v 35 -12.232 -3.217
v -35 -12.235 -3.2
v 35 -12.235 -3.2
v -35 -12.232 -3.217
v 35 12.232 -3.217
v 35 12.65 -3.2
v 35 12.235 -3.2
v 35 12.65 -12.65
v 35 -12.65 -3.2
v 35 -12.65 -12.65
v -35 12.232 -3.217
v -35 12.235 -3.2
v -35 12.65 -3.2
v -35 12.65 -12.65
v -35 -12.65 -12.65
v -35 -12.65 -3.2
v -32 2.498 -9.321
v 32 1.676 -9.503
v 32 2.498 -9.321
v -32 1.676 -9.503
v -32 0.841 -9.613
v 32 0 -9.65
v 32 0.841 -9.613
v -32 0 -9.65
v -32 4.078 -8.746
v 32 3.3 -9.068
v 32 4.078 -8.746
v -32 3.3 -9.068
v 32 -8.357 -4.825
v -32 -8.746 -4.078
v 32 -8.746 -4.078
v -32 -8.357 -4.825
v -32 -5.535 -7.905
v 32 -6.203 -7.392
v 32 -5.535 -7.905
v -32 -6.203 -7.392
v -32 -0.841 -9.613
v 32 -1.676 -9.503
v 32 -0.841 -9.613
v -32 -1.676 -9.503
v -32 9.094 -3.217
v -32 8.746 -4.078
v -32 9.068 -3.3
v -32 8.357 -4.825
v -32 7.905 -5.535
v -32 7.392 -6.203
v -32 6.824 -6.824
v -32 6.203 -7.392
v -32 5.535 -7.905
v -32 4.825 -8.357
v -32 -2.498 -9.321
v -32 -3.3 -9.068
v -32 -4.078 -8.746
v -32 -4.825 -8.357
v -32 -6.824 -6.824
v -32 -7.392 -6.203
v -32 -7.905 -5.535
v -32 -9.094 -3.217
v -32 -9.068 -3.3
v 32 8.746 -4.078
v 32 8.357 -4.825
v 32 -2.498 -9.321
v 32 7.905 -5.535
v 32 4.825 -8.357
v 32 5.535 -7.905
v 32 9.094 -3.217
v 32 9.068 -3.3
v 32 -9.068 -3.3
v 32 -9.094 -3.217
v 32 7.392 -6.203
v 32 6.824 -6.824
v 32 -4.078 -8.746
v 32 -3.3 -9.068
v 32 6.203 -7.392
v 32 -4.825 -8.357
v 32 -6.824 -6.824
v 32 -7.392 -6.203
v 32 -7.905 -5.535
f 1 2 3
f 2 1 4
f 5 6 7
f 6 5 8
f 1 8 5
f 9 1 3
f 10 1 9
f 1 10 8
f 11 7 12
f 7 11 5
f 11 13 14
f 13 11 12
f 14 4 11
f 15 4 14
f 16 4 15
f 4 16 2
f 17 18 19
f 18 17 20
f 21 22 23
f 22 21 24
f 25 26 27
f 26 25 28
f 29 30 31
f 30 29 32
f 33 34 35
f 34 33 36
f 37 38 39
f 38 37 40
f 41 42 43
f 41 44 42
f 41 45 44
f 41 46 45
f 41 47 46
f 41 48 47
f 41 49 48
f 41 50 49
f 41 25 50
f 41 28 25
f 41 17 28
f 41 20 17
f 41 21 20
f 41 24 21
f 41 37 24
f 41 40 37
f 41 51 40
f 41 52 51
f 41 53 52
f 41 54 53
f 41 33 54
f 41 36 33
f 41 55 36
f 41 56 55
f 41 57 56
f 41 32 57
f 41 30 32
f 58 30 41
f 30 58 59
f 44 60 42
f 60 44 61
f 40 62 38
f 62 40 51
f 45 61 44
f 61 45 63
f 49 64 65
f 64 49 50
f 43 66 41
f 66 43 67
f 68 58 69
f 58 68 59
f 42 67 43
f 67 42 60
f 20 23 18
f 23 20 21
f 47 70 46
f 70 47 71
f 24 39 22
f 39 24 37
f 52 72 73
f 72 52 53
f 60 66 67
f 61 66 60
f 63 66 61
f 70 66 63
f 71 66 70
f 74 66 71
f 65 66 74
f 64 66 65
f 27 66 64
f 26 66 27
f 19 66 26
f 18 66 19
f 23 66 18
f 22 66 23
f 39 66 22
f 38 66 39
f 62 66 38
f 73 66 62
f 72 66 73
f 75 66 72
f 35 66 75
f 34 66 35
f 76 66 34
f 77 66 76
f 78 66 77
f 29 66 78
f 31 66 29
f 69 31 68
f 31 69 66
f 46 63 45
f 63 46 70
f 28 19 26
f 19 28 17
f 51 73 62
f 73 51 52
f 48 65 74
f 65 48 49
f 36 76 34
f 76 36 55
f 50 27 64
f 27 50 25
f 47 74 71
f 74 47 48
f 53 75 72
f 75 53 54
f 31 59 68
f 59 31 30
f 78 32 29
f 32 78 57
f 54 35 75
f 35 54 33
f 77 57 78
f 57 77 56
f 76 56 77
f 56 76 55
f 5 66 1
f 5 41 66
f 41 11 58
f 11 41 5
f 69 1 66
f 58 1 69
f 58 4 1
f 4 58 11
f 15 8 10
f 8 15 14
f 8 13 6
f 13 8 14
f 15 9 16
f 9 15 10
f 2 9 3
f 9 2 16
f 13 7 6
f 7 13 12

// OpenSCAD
$fa = 5;
$fs = 0.4;

pennys_to_hold = 40;
holder_thickness = 3;
penny_diameter = 19.3;
penny_rad = penny_diameter/2;
penny_thickness = 1.6;
penny_shaft_height = penny_thickness*pennys_to_hold;
shell_radius = penny_diameter/2 + holder_thickness;

module penny_shaft(){
rotate([0,90,0])
cylinder(r=penny_rad,h=penny_shaft_height,center=true);
}

module holder_shaft(){
rotate([0,90,0])
cylinder(r=penny_rad+holder_thickness,h=penny_shaft_height+2*holder_thickness,center=true); 
}

union(){
difference(){
    holder_shaft();
    penny_shaft();
    translate([0,0,penny_rad/1.5])
    cube(size=[penny_shaft_height*2,penny_diameter*2,penny_diameter],center=true);
}

difference(){
    cube(size=[penny_shaft_height+2*holder_thickness,penny_diameter+2*holder_thickness,penny_diameter+2*holder_thickness],center=true);
    translate([5,0,0])
    holder_shaft();
    translate([-5,0,0])
    holder_shaft();
    translate([0,0,penny_rad-.2])
    cube(size=[penny_shaft_height+2*holder_thickness+1,penny_diameter+2*holder_thickness+1,penny_diameter+2*holder_thickness],center=true);
}}
